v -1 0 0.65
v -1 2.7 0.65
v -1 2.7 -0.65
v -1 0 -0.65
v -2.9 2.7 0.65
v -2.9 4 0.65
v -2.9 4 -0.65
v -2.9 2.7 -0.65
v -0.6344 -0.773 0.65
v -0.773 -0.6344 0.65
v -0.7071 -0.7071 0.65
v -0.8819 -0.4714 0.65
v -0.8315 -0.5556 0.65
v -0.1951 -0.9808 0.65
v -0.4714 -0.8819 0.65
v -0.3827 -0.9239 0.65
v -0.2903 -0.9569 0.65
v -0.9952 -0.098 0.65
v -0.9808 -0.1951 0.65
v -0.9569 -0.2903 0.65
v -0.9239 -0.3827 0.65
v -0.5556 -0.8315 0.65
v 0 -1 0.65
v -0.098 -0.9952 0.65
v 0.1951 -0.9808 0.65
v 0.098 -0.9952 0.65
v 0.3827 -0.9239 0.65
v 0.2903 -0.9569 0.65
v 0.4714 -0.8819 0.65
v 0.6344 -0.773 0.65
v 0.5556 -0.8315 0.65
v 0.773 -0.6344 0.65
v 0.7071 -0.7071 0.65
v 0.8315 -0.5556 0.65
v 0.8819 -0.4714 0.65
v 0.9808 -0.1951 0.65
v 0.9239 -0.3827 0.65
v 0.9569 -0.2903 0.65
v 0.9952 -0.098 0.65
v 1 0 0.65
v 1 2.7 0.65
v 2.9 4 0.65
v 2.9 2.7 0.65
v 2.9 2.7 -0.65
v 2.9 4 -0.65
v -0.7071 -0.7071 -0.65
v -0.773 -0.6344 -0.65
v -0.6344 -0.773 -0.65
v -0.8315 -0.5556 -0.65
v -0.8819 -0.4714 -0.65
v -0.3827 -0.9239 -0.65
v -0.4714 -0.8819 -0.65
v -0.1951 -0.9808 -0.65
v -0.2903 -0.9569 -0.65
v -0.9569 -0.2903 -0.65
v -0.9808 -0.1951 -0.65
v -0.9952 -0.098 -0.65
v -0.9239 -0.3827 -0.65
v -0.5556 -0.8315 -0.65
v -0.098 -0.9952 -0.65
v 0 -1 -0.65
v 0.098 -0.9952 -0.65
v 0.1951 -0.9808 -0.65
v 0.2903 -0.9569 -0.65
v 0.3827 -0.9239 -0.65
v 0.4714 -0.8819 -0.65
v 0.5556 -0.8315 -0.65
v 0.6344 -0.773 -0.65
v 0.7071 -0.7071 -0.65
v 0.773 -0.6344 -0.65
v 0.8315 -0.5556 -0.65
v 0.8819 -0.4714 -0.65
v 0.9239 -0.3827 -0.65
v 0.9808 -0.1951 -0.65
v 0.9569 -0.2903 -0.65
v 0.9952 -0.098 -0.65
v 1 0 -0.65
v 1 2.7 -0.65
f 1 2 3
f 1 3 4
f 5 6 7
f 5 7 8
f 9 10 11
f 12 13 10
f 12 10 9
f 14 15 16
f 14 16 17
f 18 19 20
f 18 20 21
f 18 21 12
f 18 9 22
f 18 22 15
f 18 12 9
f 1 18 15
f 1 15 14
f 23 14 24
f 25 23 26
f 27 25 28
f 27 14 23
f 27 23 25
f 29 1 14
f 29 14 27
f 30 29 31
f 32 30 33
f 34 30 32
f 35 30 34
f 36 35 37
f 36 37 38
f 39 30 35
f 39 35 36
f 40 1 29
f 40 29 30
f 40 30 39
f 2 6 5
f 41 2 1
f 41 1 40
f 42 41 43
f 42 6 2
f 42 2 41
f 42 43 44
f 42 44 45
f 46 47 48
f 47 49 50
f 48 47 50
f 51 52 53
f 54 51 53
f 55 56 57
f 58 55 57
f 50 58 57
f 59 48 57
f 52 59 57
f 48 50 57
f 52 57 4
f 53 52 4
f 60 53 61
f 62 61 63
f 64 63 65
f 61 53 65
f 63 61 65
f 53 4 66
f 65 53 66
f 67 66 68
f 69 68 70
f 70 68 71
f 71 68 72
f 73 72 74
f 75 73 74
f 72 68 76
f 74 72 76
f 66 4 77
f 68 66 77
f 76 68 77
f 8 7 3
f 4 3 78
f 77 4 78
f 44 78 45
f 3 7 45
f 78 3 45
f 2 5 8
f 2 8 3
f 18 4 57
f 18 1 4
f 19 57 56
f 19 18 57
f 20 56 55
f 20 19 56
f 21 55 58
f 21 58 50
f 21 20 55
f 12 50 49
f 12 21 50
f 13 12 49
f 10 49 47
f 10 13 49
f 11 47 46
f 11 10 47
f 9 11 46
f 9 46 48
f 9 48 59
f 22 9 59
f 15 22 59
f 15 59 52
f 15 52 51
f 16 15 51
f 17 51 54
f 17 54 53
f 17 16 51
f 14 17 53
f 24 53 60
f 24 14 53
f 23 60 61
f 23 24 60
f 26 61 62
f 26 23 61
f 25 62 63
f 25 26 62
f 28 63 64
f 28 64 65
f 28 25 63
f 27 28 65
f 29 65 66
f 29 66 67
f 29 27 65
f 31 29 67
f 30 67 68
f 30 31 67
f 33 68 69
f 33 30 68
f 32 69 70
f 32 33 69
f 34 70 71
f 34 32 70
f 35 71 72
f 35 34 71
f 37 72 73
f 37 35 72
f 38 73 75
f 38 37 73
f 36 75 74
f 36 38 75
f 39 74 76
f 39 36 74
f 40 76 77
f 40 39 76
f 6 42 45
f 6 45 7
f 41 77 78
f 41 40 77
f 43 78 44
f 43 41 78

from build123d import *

# Parameters (mm, degrees)
BOSS_EXTRUDE1_DEPTH = 0.65


with BuildPart() as part:
    # Sketch1 → Boss-Extrude1 (new, symmetric)
    with BuildSketch(Plane.XY):
        with BuildLine():
            Line((1, 2.7), (2.9, 2.7))
            Line((2.9, 2.7), (2.9, 4))
            Line((2.9, 4), (-2.9, 4))
            Line((-2.9, 4), (-2.9, 2.7))
            Line((-2.9, 2.7), (-1, 2.7))
            Line((-1, 2.7), (-1, 0))
            ThreePointArc((-1, 0), (0, -1), (1, 0))
            Line((1, 0), (1, 2.7))
        make_face()
    extrude(amount=BOSS_EXTRUDE1_DEPTH, both=True)


solid = part.part
